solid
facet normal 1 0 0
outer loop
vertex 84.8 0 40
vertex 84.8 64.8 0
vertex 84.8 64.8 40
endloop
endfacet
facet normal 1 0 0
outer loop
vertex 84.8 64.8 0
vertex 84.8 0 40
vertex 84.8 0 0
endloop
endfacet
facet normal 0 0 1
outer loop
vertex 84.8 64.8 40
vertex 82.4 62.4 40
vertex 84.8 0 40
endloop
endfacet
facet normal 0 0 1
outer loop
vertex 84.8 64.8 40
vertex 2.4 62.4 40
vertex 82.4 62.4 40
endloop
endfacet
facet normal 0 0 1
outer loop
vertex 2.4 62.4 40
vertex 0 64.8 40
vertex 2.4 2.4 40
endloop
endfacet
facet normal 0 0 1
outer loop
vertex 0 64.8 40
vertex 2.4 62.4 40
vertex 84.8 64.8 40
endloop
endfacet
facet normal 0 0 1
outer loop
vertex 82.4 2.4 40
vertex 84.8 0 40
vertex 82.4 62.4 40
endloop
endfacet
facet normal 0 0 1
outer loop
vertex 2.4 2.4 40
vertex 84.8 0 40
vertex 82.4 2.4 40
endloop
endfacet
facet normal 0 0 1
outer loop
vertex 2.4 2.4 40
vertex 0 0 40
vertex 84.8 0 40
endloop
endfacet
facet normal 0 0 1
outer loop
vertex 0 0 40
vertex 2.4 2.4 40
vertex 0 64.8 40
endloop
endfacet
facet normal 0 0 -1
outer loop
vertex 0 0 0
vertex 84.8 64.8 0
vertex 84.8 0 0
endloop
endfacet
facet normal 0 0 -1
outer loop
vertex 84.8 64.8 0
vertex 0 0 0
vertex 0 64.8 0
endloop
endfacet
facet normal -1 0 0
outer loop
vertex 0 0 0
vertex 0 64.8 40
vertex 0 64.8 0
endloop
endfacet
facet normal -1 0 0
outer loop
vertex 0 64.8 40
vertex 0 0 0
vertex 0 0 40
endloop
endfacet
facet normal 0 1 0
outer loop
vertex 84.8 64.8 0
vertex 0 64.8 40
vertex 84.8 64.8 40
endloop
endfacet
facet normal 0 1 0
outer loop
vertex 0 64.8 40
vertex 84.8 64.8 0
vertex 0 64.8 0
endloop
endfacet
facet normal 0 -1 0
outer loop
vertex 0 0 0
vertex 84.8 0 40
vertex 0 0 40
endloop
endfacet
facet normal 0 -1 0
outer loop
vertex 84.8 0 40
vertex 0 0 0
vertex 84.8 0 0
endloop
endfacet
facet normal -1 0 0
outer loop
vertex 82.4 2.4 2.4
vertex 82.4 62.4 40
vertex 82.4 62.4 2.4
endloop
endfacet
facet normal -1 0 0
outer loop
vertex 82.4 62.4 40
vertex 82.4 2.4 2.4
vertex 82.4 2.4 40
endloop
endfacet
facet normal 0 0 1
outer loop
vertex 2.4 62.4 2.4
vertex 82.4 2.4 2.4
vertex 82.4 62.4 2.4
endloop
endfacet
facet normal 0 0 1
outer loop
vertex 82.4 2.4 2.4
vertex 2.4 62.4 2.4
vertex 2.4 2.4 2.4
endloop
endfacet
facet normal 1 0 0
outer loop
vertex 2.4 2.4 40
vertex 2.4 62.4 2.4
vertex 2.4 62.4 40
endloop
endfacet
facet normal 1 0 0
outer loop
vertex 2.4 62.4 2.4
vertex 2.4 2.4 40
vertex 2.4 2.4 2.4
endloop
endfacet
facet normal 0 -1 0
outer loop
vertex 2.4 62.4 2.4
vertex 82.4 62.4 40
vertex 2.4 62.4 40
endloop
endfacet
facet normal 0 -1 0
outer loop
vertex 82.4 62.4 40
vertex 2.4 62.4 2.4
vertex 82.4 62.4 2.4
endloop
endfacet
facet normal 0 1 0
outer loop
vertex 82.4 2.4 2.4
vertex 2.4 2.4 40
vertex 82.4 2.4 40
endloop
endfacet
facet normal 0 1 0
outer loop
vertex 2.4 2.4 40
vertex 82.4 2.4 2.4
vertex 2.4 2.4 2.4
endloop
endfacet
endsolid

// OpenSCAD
// Open-top storage bin / parts tray - a rectangular box open at the top, for small parts
// or bench organisation. NOVEL general part.
//
// @desc open-top storage bin / parts tray
// @prompt Design an open-top storage bin in OpenSCAD: {inner_l} by {inner_w} mm inside and {height} mm tall, with {wall} mm walls and a solid floor. Reply with a single complete OpenSCAD file.
// @param inner_l inner length, mm      [30:200]
// @param inner_w inner width, mm       [30:150]
// @param height  height, mm            [15:120]
// @param wall    wall thickness, mm    [1.6:4]

inner_l = 80;
inner_w = 60;
height  = 40;
wall    = 2.4;

difference() {
    cube([inner_l + 2 * wall, inner_w + 2 * wall, height]);
    translate([wall, wall, wall]) cube([inner_l, inner_w, height]);     // hollow, open top
}
